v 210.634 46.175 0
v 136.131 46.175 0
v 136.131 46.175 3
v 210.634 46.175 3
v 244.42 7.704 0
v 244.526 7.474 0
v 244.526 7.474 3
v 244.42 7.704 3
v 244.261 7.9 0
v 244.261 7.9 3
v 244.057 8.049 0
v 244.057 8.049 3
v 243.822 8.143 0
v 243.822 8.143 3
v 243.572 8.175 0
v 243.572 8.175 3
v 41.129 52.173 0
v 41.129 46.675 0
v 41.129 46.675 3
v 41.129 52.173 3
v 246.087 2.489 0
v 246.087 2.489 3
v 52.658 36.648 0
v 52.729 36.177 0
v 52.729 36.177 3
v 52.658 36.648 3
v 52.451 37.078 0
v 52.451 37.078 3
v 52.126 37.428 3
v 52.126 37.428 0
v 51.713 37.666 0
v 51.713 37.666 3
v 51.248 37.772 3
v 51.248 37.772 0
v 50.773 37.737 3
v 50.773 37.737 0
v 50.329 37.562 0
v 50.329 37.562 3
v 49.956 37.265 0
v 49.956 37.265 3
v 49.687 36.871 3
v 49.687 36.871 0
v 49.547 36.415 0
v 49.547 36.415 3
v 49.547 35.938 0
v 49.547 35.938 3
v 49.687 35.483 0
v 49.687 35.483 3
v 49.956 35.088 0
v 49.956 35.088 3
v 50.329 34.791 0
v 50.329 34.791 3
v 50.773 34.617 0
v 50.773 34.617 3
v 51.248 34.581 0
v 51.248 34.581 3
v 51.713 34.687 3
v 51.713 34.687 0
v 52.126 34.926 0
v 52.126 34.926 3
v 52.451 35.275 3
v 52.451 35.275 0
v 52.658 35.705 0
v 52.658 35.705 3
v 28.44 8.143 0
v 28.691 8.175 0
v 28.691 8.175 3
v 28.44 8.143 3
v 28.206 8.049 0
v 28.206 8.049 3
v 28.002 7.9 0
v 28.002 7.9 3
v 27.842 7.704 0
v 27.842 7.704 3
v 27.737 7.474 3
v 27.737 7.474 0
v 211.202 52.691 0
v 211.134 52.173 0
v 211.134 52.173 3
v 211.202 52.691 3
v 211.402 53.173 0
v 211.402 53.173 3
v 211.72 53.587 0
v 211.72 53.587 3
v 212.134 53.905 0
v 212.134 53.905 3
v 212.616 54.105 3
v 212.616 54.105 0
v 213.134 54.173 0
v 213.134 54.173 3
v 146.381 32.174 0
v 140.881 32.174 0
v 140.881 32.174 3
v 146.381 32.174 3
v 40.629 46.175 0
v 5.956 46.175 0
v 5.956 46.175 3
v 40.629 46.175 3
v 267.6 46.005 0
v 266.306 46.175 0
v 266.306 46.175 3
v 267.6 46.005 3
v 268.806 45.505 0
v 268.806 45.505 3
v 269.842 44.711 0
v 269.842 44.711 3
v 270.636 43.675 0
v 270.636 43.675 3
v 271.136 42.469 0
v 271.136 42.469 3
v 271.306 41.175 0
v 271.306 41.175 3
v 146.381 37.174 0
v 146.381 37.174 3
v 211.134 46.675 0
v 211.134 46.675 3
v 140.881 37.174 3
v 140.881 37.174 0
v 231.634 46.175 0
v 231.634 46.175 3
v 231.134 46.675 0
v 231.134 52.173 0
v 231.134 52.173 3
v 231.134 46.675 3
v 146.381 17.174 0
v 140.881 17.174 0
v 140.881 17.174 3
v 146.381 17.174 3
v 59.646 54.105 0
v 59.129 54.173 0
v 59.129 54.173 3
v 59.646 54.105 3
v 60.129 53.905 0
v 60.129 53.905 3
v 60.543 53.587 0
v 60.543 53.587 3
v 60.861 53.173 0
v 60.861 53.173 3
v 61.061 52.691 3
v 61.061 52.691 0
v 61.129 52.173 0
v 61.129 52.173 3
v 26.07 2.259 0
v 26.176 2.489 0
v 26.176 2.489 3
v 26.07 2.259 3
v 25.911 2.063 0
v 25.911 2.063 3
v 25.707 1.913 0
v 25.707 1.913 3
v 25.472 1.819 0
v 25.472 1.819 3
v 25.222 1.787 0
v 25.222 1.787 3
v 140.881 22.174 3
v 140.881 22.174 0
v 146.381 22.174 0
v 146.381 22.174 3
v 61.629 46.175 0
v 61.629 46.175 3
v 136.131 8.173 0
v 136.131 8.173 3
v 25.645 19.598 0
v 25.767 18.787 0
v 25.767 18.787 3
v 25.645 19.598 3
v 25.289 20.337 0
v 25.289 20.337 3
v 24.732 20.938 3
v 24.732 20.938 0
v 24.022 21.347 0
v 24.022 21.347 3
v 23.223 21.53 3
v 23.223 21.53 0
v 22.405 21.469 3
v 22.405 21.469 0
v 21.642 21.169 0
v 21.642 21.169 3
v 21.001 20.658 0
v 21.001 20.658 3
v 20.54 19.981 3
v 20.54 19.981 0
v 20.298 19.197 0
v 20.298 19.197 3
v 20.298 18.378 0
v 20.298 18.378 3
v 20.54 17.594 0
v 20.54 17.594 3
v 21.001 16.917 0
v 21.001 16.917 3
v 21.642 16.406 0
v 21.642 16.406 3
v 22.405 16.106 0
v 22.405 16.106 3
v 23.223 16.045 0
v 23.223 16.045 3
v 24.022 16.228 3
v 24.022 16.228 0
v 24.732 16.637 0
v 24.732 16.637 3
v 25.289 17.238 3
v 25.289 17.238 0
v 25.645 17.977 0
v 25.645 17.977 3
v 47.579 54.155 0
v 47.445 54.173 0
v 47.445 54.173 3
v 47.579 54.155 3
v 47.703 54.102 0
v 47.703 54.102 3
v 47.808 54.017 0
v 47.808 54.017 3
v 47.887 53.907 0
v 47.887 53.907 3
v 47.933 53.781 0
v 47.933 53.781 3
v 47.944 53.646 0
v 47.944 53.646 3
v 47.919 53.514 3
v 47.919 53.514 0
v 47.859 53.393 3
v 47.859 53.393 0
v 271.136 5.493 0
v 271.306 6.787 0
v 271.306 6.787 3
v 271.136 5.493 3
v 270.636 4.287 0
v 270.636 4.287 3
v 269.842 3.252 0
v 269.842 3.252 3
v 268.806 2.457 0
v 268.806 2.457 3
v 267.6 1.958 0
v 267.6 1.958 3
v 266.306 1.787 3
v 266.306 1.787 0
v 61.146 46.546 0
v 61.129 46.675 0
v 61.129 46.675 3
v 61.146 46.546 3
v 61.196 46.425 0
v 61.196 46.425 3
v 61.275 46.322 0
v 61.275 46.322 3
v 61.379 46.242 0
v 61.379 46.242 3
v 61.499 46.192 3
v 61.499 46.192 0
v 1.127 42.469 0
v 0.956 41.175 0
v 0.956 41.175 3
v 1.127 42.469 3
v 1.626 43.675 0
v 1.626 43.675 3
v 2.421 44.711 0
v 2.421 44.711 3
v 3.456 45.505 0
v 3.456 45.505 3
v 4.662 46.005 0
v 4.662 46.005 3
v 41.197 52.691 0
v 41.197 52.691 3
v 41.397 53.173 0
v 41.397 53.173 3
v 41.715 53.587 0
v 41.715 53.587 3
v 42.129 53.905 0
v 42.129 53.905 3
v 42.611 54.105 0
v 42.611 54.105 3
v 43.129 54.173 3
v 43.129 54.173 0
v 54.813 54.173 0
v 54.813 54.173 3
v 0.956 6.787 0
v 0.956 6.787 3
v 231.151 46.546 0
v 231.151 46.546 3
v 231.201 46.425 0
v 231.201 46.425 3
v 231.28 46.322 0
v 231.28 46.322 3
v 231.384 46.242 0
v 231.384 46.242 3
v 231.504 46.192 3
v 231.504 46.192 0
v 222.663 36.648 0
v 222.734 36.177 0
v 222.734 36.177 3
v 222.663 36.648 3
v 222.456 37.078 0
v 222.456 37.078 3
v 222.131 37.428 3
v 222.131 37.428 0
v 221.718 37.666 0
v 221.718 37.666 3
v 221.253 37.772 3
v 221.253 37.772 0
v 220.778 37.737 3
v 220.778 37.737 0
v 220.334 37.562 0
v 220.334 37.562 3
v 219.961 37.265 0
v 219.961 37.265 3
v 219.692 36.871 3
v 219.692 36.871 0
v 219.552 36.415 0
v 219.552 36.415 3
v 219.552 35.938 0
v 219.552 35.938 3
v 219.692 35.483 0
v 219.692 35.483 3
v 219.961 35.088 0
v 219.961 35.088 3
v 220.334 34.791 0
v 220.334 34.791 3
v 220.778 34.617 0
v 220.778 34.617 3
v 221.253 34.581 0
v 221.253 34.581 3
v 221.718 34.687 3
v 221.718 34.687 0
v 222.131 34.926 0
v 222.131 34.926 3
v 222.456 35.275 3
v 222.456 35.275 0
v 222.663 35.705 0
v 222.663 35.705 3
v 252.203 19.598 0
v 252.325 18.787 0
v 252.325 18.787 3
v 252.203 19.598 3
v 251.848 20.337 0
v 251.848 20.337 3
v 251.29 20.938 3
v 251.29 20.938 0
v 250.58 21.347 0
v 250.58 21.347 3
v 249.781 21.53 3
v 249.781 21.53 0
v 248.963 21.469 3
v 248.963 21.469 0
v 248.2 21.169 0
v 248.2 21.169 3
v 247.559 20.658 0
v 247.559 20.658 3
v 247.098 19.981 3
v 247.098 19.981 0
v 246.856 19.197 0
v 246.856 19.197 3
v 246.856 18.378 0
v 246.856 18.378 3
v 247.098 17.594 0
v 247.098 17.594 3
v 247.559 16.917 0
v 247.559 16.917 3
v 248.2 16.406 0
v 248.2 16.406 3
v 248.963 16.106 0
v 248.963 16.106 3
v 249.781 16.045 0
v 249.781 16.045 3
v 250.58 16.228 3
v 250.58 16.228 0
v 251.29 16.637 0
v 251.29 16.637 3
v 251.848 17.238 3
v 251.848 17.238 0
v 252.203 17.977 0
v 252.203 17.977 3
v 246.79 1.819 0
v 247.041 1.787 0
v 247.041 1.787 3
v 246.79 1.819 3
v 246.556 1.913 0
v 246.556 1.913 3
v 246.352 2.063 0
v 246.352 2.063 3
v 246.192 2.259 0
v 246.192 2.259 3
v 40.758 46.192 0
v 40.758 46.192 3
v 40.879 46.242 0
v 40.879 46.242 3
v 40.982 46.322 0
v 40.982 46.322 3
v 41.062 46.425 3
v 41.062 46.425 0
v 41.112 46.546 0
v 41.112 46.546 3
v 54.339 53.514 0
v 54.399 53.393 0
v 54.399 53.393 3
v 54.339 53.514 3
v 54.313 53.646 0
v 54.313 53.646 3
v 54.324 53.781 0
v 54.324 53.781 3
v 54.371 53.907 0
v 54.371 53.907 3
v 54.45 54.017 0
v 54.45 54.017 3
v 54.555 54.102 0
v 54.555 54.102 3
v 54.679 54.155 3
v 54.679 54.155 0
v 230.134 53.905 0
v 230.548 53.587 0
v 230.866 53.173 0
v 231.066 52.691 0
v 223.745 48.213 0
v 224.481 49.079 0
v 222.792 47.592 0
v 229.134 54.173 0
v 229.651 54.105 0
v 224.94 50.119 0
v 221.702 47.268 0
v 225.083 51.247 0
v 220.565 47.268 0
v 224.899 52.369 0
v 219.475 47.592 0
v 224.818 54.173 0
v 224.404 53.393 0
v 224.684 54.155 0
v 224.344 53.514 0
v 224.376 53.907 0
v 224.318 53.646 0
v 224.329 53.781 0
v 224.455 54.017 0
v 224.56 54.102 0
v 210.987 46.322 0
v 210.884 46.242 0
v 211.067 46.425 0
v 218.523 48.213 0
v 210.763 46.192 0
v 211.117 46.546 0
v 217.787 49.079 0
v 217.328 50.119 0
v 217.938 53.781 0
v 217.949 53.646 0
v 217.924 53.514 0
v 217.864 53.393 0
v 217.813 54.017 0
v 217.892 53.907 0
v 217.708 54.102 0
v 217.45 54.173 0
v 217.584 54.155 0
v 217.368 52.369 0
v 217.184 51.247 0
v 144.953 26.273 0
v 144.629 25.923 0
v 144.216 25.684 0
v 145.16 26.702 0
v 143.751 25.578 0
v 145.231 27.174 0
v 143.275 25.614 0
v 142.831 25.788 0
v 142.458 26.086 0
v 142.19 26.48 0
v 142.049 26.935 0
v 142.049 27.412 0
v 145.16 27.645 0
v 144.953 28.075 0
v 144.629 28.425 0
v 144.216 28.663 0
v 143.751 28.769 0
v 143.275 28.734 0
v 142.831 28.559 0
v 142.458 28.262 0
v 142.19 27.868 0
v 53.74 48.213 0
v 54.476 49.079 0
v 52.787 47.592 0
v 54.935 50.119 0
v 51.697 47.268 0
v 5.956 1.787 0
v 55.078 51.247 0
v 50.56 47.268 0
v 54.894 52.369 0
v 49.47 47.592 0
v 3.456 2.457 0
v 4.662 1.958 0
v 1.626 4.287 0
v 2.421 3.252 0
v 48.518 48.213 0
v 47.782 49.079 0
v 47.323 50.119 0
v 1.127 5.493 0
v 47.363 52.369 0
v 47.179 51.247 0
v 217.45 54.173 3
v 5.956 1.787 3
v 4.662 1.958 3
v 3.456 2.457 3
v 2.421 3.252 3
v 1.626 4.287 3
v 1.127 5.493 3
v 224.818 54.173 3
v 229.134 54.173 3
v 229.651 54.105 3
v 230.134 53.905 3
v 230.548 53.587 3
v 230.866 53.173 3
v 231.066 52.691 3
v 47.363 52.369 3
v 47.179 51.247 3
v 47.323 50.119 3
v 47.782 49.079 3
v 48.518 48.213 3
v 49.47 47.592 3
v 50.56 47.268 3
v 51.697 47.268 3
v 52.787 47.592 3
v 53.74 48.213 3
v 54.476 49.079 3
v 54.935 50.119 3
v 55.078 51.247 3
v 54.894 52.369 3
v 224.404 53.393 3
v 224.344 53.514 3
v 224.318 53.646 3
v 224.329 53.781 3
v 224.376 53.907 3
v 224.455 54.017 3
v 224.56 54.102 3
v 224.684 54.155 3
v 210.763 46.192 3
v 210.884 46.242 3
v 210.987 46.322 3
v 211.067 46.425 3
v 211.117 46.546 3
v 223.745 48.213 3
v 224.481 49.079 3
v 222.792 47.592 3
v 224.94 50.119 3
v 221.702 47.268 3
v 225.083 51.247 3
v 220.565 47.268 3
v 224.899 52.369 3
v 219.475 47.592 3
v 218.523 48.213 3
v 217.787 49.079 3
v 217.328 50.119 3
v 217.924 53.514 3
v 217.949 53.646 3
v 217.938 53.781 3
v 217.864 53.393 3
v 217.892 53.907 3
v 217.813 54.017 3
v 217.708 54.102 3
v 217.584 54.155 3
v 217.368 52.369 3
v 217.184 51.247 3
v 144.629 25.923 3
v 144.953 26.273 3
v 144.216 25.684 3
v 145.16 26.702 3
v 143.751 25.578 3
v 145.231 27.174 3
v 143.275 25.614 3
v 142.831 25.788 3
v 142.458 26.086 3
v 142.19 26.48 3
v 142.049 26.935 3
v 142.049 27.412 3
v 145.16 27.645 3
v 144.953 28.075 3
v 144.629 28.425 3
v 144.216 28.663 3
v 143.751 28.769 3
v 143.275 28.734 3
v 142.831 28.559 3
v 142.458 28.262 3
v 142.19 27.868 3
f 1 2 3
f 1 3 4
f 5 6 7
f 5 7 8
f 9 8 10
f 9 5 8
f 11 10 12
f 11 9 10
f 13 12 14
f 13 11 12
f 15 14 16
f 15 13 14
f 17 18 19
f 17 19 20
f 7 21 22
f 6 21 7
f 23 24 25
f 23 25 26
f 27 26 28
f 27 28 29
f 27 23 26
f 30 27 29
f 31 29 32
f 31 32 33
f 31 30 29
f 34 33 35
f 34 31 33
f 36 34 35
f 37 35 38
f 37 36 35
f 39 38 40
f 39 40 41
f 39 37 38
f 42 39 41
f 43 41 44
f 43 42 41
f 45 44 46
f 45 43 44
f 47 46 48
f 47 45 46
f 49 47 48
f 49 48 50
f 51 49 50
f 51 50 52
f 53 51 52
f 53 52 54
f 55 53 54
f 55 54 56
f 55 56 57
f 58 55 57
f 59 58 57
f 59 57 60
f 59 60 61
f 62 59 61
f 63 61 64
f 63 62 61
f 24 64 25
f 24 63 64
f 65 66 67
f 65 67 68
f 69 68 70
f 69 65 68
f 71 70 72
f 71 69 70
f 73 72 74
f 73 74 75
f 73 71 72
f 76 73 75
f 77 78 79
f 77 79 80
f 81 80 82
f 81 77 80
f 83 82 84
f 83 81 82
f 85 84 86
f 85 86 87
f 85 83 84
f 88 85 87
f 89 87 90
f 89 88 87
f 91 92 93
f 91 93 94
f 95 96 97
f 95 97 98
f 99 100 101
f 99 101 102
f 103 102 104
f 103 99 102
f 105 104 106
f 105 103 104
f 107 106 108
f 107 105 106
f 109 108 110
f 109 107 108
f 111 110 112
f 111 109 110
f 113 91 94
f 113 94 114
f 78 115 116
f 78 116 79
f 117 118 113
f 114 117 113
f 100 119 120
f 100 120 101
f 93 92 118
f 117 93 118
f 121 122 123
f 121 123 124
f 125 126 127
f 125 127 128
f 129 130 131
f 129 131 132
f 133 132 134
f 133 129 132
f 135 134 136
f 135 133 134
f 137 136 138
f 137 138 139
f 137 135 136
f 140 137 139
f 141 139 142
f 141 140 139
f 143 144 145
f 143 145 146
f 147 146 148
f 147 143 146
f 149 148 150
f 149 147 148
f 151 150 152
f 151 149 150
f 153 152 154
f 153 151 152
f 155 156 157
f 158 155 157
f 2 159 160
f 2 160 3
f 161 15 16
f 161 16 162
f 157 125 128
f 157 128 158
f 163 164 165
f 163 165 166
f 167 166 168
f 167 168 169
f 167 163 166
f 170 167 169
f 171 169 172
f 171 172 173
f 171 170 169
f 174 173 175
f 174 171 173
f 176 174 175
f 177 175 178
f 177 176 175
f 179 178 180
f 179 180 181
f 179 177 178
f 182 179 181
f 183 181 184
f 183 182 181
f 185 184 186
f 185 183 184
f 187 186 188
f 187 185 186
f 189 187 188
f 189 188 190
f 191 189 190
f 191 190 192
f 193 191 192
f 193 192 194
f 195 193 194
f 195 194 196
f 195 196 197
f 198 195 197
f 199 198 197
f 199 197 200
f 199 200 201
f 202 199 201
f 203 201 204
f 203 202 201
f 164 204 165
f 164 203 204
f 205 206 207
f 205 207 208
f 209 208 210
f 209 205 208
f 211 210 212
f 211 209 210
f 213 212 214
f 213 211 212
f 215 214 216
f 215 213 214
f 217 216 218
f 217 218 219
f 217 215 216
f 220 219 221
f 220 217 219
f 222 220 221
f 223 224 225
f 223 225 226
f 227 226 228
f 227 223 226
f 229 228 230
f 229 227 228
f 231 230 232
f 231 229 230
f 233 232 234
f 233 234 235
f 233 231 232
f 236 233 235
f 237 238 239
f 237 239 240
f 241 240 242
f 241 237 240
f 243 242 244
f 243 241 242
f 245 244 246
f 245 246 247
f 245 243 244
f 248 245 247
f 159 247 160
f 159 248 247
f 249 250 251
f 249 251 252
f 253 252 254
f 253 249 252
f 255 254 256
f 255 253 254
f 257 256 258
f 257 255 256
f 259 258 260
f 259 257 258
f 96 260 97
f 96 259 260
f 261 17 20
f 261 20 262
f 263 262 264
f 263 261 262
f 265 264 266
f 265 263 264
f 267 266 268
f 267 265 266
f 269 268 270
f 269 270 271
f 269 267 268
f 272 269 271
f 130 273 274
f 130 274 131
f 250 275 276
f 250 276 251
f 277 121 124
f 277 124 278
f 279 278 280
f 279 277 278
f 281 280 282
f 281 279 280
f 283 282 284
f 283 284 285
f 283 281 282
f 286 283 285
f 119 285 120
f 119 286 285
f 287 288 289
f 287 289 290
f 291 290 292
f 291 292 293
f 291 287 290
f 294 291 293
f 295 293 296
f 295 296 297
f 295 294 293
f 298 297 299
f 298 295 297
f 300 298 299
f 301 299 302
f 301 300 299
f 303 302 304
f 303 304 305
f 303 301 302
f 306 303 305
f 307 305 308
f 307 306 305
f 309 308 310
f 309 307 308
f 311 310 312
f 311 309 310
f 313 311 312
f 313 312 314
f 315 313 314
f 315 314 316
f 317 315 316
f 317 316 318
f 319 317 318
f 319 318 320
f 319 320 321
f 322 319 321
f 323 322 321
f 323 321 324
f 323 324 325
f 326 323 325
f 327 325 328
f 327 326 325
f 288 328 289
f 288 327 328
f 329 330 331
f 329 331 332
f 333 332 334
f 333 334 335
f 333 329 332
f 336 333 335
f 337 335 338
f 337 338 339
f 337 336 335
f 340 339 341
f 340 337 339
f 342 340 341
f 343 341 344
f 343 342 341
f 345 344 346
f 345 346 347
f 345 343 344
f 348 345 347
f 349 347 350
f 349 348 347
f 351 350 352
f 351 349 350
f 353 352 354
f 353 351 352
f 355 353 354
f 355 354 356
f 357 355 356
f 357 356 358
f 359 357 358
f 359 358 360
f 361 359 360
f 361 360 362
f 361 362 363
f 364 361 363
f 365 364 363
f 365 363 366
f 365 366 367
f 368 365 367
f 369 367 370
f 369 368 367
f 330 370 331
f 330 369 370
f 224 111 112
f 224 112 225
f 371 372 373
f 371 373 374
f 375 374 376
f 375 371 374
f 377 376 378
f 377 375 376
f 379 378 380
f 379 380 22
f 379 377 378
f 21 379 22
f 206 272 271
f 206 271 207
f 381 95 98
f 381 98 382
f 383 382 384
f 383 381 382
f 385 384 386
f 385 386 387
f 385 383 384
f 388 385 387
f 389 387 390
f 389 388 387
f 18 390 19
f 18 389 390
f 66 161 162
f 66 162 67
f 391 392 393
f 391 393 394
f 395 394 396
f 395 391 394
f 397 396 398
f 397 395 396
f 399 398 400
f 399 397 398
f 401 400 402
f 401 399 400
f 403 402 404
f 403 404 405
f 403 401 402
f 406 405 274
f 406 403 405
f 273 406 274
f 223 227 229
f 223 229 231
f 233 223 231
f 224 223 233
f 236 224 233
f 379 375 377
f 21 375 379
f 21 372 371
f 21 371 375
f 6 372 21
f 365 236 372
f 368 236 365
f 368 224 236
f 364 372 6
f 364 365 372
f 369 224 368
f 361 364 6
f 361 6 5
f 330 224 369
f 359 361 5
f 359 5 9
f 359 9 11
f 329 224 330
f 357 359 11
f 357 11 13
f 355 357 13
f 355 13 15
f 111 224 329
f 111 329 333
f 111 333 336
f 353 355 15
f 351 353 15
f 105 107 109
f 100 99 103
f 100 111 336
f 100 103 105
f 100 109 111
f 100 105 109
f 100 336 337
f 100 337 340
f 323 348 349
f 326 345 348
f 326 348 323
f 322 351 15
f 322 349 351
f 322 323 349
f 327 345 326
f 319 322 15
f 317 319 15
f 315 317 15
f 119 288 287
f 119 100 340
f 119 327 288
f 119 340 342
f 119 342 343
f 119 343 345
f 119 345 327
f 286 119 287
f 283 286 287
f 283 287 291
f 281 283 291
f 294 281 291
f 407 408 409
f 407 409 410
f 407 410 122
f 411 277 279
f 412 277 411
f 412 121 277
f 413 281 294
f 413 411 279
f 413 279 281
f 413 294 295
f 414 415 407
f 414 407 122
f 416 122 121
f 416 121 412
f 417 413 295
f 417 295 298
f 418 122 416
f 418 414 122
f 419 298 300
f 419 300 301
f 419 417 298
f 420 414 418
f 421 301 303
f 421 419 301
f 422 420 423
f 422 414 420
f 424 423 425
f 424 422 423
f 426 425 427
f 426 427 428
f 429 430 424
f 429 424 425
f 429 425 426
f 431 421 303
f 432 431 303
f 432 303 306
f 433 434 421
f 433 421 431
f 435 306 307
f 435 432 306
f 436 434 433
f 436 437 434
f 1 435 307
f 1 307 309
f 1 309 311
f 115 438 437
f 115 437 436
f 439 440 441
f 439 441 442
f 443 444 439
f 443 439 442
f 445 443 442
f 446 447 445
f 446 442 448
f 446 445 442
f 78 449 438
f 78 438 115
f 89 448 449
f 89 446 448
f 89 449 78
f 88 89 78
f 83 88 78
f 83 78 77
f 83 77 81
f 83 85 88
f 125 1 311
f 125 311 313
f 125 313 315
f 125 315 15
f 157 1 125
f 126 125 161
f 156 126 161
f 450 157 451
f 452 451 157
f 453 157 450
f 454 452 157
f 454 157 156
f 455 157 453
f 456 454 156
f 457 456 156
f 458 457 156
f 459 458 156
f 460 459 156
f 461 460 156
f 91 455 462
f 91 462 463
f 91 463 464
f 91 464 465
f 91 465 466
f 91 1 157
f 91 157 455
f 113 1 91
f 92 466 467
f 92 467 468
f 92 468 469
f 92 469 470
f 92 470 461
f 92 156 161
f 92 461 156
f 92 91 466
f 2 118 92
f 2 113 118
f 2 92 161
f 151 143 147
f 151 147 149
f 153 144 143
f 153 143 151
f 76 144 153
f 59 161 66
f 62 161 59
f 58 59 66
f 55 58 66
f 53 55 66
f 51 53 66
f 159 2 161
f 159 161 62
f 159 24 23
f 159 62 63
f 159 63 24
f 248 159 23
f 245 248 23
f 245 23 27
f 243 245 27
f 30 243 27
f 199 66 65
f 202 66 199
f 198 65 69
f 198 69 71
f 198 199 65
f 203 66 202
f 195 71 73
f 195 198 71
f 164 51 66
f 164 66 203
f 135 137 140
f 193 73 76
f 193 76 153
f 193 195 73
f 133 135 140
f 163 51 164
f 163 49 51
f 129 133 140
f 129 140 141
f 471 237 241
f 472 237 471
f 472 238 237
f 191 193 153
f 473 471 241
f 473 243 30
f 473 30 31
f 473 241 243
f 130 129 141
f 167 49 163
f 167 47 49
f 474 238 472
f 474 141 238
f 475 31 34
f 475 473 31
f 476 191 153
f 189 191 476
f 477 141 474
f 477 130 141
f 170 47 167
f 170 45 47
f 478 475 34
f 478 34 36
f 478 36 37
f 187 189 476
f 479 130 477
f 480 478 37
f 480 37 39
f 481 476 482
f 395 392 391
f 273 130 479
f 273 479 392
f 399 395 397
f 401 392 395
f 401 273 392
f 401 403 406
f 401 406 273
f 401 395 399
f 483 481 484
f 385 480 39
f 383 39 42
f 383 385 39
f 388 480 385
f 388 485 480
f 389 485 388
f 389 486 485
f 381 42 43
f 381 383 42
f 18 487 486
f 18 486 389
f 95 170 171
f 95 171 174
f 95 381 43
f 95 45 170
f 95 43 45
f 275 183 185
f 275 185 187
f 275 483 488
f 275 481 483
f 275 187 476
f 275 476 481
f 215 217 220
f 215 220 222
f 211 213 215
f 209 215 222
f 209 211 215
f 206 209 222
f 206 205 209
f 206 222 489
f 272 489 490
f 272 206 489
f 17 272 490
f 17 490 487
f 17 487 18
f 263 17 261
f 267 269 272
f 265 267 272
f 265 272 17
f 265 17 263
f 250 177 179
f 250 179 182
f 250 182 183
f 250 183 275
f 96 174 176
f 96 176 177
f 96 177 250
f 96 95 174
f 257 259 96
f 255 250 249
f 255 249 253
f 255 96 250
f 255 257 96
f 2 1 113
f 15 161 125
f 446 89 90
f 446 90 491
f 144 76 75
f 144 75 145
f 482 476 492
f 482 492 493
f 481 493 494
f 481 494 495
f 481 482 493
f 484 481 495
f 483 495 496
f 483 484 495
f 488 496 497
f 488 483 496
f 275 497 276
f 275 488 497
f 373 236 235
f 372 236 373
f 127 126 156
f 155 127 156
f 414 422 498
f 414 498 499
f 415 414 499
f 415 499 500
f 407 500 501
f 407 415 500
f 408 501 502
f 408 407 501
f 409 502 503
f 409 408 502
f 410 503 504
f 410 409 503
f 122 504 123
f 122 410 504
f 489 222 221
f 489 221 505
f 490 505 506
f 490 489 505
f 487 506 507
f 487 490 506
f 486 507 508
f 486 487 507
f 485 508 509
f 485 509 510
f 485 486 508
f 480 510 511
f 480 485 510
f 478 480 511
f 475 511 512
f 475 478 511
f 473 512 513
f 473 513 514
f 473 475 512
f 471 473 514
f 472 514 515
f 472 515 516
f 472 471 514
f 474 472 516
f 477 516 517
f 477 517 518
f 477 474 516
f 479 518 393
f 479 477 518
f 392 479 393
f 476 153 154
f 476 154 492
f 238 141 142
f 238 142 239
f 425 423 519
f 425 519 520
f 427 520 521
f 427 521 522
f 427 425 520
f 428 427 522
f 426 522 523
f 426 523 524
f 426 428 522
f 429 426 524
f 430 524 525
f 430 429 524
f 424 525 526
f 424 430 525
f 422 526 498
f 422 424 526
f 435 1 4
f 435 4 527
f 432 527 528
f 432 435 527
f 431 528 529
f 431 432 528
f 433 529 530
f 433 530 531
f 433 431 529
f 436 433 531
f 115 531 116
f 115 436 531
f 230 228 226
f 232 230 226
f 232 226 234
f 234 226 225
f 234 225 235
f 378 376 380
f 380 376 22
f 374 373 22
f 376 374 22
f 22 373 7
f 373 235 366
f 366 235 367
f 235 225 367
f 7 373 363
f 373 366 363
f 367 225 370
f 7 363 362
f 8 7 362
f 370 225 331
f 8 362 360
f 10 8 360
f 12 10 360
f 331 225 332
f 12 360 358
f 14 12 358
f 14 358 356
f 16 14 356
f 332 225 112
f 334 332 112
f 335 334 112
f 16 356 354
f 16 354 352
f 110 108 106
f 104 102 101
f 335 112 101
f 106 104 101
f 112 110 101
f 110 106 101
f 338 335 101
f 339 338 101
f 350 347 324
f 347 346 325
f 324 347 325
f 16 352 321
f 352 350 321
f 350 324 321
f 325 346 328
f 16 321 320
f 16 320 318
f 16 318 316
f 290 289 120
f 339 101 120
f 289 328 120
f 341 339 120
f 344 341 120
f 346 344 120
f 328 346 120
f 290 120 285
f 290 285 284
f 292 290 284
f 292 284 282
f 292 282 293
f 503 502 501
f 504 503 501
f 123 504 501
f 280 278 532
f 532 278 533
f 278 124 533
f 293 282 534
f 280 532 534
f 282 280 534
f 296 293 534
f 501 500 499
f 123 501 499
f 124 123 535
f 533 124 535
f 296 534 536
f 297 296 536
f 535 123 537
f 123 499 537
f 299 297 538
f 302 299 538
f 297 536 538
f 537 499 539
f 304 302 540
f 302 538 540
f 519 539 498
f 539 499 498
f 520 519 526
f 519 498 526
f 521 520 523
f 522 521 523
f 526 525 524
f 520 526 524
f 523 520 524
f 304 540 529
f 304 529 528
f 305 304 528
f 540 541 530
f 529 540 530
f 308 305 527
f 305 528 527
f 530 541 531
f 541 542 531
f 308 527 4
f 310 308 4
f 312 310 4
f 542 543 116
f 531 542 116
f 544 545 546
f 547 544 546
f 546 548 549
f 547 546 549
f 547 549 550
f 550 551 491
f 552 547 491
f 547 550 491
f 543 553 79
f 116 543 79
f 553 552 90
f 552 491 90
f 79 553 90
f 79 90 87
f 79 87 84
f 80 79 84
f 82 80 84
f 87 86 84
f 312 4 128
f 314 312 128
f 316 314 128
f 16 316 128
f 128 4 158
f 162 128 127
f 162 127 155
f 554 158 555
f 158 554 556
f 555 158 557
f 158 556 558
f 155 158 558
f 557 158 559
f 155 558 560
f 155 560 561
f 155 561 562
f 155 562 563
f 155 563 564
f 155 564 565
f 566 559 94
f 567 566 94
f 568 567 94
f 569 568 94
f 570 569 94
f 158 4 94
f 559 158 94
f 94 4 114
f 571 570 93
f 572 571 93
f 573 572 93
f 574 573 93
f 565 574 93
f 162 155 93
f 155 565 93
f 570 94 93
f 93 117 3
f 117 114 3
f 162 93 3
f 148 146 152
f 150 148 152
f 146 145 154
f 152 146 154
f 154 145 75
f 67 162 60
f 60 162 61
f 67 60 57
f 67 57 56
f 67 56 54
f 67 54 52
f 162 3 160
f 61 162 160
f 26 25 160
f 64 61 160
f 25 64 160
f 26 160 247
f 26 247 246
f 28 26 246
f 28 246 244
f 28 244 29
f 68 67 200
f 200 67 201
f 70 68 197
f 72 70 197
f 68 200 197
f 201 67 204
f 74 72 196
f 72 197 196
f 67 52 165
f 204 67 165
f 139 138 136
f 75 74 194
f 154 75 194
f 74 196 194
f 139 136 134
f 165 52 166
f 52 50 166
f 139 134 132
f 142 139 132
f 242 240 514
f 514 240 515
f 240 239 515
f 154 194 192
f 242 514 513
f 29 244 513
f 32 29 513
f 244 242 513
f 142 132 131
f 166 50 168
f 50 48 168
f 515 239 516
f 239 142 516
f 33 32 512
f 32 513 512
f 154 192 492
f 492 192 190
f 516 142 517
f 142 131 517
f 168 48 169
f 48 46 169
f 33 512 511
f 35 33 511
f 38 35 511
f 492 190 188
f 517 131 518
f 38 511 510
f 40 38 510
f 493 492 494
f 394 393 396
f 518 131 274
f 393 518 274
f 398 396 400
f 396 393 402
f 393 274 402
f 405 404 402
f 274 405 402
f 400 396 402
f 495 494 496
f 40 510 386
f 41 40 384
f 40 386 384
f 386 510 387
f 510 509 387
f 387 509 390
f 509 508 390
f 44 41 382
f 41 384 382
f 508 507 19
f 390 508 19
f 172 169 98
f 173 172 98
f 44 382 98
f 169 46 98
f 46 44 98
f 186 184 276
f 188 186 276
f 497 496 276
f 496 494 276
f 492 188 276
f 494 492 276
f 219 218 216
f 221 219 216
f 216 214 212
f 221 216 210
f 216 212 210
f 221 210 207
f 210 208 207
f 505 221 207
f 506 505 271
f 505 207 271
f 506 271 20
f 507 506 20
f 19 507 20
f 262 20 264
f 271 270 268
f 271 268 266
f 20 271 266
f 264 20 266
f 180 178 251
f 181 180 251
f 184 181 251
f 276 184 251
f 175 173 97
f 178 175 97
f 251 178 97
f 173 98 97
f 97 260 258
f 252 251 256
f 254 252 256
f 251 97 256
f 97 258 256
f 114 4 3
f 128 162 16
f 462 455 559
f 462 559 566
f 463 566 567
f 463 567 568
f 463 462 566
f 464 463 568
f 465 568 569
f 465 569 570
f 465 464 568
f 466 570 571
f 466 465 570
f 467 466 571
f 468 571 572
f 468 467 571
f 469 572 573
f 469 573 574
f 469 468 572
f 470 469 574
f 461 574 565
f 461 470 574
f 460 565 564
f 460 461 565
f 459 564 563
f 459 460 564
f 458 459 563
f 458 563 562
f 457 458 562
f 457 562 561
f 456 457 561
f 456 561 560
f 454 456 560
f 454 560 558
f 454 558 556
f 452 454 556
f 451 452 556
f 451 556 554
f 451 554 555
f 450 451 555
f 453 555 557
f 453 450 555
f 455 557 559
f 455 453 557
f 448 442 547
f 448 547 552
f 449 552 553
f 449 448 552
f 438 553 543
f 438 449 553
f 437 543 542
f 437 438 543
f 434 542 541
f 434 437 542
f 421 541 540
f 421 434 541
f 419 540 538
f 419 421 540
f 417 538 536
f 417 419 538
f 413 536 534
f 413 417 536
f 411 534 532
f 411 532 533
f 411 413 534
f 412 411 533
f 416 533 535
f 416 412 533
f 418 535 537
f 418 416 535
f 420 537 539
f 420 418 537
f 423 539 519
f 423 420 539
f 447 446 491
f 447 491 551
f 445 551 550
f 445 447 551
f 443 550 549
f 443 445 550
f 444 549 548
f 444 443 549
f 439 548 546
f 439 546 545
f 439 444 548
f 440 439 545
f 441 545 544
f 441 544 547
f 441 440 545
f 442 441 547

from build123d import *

# Parameters (mm, degrees)
MODEL_R                 = 1.6
MODEL_R_2               = 2.75
MODEL_W                 = 5.5
MODEL_H                 = 5
SALIENTE_EXTRUIR1_DEPTH = 3


with BuildPart() as part:
    # Model → Saliente-Extruir1 (new body)
    with BuildSketch(Plane.XY):
        with BuildLine():
            Line((136.131313967, 8.172644832), (28.691078747, 8.175075185))
            ThreePointArc((28.691078747, 8.175075185), (28.098964944, 7.980929542), (27.736763771, 7.473877674))
            Line((27.736763771, 7.473877674), (26.175859161, 2.488662696))
            ThreePointArc((26.175859161, 2.488662696), (25.813657989, 1.981610828), (25.221544186, 1.787465185))
            Line((25.221544186, 1.787465185), (5.956313823, 1.787465185))
            ThreePointArc((5.956313823, 1.787465185), (2.420778394, 3.251930446), (0.956311467, 6.787465185))
            Line((0.956311467, 6.787465185), (0.956311467, 41.175060185))
            ThreePointArc((0.956311467, 41.175060185), (2.420777561, 44.710594091), (5.956311467, 46.175060185))
            Line((5.956311467, 46.175060185), (10.956311467, 46.175060185))
            Line((10.956311467, 46.175060185), (40.628815467, 46.175060185))
            ThreePointArc((40.628815467, 46.175060185), (40.982368857, 46.321506794), (41.128815467, 46.675060185))
            Line((41.128815467, 46.675060185), (41.128815467, 52.173080185))
            ThreePointArc((41.128815467, 52.173080185), (41.714601904, 53.587293747), (43.128815467, 54.173080185))
            Line((43.128815467, 54.173080185), (47.444968064, 54.173080185))
            ThreePointArc((47.444968064, 54.173080185), (47.886694472, 53.907340256), (47.858883503, 53.392591309))
            ThreePointArc((47.858883503, 53.392591309), (51.128815467, 47.226729185), (54.39874743, 53.392591309))
            ThreePointArc((54.39874743, 53.392591309), (54.370936461, 53.907340256), (54.812662869, 54.173080185))
            Line((54.812662869, 54.173080185), (59.128815467, 54.173080185))
            ThreePointArc((59.128815467, 54.173080185), (60.543029029, 53.587293747), (61.128815467, 52.173080185))
            Line((61.128815467, 52.173080185), (61.128815467, 46.675057185))
            ThreePointArc((61.128815467, 46.675057185), (61.275262076, 46.321503794), (61.628815467, 46.175057185))
            Line((61.628815467, 46.175057185), (136.131313967, 46.175058685))
            Line((136.131313967, 46.175058685), (210.633812467, 46.175057185))
            ThreePointArc((210.633812467, 46.175057185), (210.987365857, 46.321503794), (211.133812467, 46.675057185))
            Line((211.133812467, 46.675057185), (211.133812467, 52.173080185))
            ThreePointArc((211.133812467, 52.173080185), (211.719598904, 53.587293747), (213.133812467, 54.173080185))
            Line((213.133812467, 54.173080185), (217.449965065, 54.173080185))
            ThreePointArc((217.449965065, 54.173080185), (217.891691472, 53.907340256), (217.863880503, 53.392591309))
            ThreePointArc((217.863880503, 53.392591309), (221.133812467, 47.226729185), (224.403744431, 53.392591309))
            ThreePointArc((224.403744431, 53.392591309), (224.375933462, 53.907340256), (224.81765987, 54.173080185))
            Line((224.81765987, 54.173080185), (229.133812467, 54.173080185))
            ThreePointArc((229.133812467, 54.173080185), (230.548026029, 53.587293747), (231.133812467, 52.173080185))
            Line((231.133812467, 52.173080185), (231.133812467, 46.675060185))
            ThreePointArc((231.133812467, 46.675060185), (231.280259076, 46.321506794), (231.633812467, 46.175060185))
            Line((231.633812467, 46.175060185), (261.306316467, 46.175060185))
            Line((261.306316467, 46.175060185), (266.306316467, 46.175060185))
            ThreePointArc((266.306316467, 46.175060185), (269.841850373, 44.710594091), (271.306316467, 41.175060185))
            Line((271.306316467, 41.175060185), (271.306316467, 6.787465185))
            ThreePointArc((271.306316467, 6.787465185), (269.84184954, 3.251930446), (266.306314111, 1.787465185))
            Line((266.306314111, 1.787465185), (247.041083748, 1.787465185))
            ThreePointArc((247.041083748, 1.787465185), (246.448969945, 1.981610828), (246.086768772, 2.488662696))
            Line((246.086768772, 2.488662696), (244.525864162, 7.473877674))
            ThreePointArc((244.525864162, 7.473877674), (244.16366299, 7.980929542), (243.571549187, 8.175075185))
            Line((243.571549187, 8.175075185), (136.131313967, 8.172644832))
        make_face()
        with Locations((51.128815467, 36.176729185)):
            Circle(MODEL_R, mode=Mode.SUBTRACT)
        with Locations((221.133812467, 36.176729185)):
            Circle(MODEL_R, mode=Mode.SUBTRACT)
        with Locations((143.631313967, 27.173851758)):
            Circle(MODEL_R, mode=Mode.SUBTRACT)
        with Locations((23.017213967, 18.787465185)):
            Circle(MODEL_R_2, mode=Mode.SUBTRACT)
        with Locations((249.575379967, 18.787465185)):
            Circle(MODEL_R_2, mode=Mode.SUBTRACT)
        with Locations((143.631313967, 34.673851758)):
            Rectangle(MODEL_W, MODEL_H, mode=Mode.SUBTRACT)
        with Locations((143.631313967, 19.673851758)):
            Rectangle(MODEL_W, MODEL_H, mode=Mode.SUBTRACT)
    extrude(amount=SALIENTE_EXTRUIR1_DEPTH)


solid = part.part
